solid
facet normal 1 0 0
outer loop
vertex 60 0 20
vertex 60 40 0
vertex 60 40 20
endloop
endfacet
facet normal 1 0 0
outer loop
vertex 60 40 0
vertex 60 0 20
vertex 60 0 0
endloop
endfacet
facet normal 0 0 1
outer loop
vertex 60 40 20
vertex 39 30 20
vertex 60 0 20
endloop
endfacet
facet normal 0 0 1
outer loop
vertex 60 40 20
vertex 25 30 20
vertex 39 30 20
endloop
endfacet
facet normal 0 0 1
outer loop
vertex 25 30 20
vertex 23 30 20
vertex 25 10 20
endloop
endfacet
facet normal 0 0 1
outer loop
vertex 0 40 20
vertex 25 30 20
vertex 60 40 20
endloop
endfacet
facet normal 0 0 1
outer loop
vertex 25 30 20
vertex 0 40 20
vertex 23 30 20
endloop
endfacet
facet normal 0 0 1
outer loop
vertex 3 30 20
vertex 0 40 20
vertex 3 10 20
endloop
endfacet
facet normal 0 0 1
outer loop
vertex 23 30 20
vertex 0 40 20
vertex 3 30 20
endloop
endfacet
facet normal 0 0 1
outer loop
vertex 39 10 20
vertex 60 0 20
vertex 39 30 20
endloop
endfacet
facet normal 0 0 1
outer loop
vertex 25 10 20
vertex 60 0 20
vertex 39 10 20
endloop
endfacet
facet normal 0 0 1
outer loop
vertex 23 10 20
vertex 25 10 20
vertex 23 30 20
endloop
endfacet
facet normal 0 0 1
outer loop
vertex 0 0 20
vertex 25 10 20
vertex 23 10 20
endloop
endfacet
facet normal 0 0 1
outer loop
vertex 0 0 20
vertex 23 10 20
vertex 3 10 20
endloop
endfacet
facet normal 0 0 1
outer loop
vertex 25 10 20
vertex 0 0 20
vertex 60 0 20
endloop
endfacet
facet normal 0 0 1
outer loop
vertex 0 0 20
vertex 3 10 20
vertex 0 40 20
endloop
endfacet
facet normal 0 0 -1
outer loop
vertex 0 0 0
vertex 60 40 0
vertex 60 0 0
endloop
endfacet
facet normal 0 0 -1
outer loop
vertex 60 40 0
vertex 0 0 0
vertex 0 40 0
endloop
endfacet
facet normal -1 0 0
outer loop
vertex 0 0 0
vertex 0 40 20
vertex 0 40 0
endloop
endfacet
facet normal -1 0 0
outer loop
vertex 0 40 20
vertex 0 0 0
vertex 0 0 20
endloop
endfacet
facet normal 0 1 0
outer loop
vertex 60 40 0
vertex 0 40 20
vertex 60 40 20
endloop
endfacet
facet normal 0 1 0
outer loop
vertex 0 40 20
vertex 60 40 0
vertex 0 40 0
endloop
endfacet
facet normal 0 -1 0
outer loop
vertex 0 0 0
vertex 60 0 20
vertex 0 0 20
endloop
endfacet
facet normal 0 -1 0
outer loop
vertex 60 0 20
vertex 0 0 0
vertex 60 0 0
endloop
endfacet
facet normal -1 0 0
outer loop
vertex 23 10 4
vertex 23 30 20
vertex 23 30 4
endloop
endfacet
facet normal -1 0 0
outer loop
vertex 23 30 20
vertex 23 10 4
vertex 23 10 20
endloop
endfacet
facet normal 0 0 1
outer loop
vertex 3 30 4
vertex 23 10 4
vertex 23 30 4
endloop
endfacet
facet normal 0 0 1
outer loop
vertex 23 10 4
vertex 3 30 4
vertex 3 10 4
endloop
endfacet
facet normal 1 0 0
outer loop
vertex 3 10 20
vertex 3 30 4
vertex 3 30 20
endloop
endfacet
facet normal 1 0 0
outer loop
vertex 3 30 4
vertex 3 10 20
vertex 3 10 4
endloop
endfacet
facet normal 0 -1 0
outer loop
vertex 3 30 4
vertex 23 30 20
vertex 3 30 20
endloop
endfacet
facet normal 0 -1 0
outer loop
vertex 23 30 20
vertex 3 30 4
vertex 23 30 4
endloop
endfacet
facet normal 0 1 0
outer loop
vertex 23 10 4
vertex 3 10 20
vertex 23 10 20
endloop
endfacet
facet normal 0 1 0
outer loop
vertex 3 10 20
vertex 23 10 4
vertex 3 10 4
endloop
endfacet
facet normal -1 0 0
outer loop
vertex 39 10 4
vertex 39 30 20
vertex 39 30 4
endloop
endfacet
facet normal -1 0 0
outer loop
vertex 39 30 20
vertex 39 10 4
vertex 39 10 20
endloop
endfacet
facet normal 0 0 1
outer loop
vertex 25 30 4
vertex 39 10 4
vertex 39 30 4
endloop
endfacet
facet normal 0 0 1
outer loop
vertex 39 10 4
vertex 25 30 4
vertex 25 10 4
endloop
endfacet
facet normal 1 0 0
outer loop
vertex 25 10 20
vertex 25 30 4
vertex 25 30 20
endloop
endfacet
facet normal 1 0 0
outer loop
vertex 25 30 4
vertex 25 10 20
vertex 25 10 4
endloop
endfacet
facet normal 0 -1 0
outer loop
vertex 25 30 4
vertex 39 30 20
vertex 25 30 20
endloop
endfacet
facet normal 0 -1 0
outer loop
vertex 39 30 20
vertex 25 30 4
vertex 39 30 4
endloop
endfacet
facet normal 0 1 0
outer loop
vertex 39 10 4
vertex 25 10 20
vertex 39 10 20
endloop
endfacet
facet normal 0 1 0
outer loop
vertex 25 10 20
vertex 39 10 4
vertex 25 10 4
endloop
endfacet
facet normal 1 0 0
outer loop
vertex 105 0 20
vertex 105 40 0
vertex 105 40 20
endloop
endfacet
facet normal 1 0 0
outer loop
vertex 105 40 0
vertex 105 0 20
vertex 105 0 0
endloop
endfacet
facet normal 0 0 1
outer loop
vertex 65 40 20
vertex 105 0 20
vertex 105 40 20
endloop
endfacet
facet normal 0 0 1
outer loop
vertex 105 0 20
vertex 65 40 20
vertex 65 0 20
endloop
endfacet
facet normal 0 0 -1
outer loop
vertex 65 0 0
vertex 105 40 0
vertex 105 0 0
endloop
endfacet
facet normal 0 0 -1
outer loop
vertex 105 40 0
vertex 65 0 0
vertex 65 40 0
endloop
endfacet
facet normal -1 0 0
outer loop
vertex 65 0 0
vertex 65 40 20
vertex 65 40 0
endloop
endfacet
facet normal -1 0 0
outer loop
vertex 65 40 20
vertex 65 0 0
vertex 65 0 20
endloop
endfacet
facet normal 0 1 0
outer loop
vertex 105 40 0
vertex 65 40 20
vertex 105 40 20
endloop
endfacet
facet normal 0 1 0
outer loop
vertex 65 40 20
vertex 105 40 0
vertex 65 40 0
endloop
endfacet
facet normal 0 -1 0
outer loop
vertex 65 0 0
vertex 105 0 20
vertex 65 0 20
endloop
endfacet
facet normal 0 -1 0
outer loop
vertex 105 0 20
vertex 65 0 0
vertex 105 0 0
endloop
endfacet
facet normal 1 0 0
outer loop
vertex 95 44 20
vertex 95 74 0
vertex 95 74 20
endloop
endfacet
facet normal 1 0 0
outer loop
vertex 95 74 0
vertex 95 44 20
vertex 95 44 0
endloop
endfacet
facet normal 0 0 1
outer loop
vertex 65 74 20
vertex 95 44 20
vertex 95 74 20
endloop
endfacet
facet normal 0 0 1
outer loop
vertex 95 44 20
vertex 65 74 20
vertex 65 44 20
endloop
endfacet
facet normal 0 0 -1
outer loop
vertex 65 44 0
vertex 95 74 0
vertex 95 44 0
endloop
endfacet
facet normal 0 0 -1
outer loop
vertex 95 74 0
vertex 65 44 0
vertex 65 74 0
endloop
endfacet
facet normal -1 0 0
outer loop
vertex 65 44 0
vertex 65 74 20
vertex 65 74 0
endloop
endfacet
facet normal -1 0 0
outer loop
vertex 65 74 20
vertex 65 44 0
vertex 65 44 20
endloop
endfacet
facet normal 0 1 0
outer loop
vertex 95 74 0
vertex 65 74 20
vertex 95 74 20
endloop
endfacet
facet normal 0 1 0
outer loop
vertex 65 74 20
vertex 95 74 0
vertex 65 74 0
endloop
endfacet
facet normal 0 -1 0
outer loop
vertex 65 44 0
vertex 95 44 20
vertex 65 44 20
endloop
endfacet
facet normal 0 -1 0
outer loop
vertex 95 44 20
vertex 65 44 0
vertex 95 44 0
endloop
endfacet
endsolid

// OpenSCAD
$fn=48;
translate([0,0,0])
{
difference()
{
    cube(size = [60.00, 40.00, 20.00], center = false); 
    translate(v = [3.00, 10.00, 4.00])
    {
        cube(size = [20.00, 20.00, 16.00], center = false); 
    }
    translate(v = [25.00, 10.00, 4.00])
    {
        cube(size = [14.00, 20.00, 16.00], center = false); 
    }
}

}
translate([65,0,0])
{
cube(size = [40.00, 40.00, 20.00], center = false); 

}
translate([65,44,0])
{
cube(size = [30.00, 30.00, 20.00], center = false); 

}
